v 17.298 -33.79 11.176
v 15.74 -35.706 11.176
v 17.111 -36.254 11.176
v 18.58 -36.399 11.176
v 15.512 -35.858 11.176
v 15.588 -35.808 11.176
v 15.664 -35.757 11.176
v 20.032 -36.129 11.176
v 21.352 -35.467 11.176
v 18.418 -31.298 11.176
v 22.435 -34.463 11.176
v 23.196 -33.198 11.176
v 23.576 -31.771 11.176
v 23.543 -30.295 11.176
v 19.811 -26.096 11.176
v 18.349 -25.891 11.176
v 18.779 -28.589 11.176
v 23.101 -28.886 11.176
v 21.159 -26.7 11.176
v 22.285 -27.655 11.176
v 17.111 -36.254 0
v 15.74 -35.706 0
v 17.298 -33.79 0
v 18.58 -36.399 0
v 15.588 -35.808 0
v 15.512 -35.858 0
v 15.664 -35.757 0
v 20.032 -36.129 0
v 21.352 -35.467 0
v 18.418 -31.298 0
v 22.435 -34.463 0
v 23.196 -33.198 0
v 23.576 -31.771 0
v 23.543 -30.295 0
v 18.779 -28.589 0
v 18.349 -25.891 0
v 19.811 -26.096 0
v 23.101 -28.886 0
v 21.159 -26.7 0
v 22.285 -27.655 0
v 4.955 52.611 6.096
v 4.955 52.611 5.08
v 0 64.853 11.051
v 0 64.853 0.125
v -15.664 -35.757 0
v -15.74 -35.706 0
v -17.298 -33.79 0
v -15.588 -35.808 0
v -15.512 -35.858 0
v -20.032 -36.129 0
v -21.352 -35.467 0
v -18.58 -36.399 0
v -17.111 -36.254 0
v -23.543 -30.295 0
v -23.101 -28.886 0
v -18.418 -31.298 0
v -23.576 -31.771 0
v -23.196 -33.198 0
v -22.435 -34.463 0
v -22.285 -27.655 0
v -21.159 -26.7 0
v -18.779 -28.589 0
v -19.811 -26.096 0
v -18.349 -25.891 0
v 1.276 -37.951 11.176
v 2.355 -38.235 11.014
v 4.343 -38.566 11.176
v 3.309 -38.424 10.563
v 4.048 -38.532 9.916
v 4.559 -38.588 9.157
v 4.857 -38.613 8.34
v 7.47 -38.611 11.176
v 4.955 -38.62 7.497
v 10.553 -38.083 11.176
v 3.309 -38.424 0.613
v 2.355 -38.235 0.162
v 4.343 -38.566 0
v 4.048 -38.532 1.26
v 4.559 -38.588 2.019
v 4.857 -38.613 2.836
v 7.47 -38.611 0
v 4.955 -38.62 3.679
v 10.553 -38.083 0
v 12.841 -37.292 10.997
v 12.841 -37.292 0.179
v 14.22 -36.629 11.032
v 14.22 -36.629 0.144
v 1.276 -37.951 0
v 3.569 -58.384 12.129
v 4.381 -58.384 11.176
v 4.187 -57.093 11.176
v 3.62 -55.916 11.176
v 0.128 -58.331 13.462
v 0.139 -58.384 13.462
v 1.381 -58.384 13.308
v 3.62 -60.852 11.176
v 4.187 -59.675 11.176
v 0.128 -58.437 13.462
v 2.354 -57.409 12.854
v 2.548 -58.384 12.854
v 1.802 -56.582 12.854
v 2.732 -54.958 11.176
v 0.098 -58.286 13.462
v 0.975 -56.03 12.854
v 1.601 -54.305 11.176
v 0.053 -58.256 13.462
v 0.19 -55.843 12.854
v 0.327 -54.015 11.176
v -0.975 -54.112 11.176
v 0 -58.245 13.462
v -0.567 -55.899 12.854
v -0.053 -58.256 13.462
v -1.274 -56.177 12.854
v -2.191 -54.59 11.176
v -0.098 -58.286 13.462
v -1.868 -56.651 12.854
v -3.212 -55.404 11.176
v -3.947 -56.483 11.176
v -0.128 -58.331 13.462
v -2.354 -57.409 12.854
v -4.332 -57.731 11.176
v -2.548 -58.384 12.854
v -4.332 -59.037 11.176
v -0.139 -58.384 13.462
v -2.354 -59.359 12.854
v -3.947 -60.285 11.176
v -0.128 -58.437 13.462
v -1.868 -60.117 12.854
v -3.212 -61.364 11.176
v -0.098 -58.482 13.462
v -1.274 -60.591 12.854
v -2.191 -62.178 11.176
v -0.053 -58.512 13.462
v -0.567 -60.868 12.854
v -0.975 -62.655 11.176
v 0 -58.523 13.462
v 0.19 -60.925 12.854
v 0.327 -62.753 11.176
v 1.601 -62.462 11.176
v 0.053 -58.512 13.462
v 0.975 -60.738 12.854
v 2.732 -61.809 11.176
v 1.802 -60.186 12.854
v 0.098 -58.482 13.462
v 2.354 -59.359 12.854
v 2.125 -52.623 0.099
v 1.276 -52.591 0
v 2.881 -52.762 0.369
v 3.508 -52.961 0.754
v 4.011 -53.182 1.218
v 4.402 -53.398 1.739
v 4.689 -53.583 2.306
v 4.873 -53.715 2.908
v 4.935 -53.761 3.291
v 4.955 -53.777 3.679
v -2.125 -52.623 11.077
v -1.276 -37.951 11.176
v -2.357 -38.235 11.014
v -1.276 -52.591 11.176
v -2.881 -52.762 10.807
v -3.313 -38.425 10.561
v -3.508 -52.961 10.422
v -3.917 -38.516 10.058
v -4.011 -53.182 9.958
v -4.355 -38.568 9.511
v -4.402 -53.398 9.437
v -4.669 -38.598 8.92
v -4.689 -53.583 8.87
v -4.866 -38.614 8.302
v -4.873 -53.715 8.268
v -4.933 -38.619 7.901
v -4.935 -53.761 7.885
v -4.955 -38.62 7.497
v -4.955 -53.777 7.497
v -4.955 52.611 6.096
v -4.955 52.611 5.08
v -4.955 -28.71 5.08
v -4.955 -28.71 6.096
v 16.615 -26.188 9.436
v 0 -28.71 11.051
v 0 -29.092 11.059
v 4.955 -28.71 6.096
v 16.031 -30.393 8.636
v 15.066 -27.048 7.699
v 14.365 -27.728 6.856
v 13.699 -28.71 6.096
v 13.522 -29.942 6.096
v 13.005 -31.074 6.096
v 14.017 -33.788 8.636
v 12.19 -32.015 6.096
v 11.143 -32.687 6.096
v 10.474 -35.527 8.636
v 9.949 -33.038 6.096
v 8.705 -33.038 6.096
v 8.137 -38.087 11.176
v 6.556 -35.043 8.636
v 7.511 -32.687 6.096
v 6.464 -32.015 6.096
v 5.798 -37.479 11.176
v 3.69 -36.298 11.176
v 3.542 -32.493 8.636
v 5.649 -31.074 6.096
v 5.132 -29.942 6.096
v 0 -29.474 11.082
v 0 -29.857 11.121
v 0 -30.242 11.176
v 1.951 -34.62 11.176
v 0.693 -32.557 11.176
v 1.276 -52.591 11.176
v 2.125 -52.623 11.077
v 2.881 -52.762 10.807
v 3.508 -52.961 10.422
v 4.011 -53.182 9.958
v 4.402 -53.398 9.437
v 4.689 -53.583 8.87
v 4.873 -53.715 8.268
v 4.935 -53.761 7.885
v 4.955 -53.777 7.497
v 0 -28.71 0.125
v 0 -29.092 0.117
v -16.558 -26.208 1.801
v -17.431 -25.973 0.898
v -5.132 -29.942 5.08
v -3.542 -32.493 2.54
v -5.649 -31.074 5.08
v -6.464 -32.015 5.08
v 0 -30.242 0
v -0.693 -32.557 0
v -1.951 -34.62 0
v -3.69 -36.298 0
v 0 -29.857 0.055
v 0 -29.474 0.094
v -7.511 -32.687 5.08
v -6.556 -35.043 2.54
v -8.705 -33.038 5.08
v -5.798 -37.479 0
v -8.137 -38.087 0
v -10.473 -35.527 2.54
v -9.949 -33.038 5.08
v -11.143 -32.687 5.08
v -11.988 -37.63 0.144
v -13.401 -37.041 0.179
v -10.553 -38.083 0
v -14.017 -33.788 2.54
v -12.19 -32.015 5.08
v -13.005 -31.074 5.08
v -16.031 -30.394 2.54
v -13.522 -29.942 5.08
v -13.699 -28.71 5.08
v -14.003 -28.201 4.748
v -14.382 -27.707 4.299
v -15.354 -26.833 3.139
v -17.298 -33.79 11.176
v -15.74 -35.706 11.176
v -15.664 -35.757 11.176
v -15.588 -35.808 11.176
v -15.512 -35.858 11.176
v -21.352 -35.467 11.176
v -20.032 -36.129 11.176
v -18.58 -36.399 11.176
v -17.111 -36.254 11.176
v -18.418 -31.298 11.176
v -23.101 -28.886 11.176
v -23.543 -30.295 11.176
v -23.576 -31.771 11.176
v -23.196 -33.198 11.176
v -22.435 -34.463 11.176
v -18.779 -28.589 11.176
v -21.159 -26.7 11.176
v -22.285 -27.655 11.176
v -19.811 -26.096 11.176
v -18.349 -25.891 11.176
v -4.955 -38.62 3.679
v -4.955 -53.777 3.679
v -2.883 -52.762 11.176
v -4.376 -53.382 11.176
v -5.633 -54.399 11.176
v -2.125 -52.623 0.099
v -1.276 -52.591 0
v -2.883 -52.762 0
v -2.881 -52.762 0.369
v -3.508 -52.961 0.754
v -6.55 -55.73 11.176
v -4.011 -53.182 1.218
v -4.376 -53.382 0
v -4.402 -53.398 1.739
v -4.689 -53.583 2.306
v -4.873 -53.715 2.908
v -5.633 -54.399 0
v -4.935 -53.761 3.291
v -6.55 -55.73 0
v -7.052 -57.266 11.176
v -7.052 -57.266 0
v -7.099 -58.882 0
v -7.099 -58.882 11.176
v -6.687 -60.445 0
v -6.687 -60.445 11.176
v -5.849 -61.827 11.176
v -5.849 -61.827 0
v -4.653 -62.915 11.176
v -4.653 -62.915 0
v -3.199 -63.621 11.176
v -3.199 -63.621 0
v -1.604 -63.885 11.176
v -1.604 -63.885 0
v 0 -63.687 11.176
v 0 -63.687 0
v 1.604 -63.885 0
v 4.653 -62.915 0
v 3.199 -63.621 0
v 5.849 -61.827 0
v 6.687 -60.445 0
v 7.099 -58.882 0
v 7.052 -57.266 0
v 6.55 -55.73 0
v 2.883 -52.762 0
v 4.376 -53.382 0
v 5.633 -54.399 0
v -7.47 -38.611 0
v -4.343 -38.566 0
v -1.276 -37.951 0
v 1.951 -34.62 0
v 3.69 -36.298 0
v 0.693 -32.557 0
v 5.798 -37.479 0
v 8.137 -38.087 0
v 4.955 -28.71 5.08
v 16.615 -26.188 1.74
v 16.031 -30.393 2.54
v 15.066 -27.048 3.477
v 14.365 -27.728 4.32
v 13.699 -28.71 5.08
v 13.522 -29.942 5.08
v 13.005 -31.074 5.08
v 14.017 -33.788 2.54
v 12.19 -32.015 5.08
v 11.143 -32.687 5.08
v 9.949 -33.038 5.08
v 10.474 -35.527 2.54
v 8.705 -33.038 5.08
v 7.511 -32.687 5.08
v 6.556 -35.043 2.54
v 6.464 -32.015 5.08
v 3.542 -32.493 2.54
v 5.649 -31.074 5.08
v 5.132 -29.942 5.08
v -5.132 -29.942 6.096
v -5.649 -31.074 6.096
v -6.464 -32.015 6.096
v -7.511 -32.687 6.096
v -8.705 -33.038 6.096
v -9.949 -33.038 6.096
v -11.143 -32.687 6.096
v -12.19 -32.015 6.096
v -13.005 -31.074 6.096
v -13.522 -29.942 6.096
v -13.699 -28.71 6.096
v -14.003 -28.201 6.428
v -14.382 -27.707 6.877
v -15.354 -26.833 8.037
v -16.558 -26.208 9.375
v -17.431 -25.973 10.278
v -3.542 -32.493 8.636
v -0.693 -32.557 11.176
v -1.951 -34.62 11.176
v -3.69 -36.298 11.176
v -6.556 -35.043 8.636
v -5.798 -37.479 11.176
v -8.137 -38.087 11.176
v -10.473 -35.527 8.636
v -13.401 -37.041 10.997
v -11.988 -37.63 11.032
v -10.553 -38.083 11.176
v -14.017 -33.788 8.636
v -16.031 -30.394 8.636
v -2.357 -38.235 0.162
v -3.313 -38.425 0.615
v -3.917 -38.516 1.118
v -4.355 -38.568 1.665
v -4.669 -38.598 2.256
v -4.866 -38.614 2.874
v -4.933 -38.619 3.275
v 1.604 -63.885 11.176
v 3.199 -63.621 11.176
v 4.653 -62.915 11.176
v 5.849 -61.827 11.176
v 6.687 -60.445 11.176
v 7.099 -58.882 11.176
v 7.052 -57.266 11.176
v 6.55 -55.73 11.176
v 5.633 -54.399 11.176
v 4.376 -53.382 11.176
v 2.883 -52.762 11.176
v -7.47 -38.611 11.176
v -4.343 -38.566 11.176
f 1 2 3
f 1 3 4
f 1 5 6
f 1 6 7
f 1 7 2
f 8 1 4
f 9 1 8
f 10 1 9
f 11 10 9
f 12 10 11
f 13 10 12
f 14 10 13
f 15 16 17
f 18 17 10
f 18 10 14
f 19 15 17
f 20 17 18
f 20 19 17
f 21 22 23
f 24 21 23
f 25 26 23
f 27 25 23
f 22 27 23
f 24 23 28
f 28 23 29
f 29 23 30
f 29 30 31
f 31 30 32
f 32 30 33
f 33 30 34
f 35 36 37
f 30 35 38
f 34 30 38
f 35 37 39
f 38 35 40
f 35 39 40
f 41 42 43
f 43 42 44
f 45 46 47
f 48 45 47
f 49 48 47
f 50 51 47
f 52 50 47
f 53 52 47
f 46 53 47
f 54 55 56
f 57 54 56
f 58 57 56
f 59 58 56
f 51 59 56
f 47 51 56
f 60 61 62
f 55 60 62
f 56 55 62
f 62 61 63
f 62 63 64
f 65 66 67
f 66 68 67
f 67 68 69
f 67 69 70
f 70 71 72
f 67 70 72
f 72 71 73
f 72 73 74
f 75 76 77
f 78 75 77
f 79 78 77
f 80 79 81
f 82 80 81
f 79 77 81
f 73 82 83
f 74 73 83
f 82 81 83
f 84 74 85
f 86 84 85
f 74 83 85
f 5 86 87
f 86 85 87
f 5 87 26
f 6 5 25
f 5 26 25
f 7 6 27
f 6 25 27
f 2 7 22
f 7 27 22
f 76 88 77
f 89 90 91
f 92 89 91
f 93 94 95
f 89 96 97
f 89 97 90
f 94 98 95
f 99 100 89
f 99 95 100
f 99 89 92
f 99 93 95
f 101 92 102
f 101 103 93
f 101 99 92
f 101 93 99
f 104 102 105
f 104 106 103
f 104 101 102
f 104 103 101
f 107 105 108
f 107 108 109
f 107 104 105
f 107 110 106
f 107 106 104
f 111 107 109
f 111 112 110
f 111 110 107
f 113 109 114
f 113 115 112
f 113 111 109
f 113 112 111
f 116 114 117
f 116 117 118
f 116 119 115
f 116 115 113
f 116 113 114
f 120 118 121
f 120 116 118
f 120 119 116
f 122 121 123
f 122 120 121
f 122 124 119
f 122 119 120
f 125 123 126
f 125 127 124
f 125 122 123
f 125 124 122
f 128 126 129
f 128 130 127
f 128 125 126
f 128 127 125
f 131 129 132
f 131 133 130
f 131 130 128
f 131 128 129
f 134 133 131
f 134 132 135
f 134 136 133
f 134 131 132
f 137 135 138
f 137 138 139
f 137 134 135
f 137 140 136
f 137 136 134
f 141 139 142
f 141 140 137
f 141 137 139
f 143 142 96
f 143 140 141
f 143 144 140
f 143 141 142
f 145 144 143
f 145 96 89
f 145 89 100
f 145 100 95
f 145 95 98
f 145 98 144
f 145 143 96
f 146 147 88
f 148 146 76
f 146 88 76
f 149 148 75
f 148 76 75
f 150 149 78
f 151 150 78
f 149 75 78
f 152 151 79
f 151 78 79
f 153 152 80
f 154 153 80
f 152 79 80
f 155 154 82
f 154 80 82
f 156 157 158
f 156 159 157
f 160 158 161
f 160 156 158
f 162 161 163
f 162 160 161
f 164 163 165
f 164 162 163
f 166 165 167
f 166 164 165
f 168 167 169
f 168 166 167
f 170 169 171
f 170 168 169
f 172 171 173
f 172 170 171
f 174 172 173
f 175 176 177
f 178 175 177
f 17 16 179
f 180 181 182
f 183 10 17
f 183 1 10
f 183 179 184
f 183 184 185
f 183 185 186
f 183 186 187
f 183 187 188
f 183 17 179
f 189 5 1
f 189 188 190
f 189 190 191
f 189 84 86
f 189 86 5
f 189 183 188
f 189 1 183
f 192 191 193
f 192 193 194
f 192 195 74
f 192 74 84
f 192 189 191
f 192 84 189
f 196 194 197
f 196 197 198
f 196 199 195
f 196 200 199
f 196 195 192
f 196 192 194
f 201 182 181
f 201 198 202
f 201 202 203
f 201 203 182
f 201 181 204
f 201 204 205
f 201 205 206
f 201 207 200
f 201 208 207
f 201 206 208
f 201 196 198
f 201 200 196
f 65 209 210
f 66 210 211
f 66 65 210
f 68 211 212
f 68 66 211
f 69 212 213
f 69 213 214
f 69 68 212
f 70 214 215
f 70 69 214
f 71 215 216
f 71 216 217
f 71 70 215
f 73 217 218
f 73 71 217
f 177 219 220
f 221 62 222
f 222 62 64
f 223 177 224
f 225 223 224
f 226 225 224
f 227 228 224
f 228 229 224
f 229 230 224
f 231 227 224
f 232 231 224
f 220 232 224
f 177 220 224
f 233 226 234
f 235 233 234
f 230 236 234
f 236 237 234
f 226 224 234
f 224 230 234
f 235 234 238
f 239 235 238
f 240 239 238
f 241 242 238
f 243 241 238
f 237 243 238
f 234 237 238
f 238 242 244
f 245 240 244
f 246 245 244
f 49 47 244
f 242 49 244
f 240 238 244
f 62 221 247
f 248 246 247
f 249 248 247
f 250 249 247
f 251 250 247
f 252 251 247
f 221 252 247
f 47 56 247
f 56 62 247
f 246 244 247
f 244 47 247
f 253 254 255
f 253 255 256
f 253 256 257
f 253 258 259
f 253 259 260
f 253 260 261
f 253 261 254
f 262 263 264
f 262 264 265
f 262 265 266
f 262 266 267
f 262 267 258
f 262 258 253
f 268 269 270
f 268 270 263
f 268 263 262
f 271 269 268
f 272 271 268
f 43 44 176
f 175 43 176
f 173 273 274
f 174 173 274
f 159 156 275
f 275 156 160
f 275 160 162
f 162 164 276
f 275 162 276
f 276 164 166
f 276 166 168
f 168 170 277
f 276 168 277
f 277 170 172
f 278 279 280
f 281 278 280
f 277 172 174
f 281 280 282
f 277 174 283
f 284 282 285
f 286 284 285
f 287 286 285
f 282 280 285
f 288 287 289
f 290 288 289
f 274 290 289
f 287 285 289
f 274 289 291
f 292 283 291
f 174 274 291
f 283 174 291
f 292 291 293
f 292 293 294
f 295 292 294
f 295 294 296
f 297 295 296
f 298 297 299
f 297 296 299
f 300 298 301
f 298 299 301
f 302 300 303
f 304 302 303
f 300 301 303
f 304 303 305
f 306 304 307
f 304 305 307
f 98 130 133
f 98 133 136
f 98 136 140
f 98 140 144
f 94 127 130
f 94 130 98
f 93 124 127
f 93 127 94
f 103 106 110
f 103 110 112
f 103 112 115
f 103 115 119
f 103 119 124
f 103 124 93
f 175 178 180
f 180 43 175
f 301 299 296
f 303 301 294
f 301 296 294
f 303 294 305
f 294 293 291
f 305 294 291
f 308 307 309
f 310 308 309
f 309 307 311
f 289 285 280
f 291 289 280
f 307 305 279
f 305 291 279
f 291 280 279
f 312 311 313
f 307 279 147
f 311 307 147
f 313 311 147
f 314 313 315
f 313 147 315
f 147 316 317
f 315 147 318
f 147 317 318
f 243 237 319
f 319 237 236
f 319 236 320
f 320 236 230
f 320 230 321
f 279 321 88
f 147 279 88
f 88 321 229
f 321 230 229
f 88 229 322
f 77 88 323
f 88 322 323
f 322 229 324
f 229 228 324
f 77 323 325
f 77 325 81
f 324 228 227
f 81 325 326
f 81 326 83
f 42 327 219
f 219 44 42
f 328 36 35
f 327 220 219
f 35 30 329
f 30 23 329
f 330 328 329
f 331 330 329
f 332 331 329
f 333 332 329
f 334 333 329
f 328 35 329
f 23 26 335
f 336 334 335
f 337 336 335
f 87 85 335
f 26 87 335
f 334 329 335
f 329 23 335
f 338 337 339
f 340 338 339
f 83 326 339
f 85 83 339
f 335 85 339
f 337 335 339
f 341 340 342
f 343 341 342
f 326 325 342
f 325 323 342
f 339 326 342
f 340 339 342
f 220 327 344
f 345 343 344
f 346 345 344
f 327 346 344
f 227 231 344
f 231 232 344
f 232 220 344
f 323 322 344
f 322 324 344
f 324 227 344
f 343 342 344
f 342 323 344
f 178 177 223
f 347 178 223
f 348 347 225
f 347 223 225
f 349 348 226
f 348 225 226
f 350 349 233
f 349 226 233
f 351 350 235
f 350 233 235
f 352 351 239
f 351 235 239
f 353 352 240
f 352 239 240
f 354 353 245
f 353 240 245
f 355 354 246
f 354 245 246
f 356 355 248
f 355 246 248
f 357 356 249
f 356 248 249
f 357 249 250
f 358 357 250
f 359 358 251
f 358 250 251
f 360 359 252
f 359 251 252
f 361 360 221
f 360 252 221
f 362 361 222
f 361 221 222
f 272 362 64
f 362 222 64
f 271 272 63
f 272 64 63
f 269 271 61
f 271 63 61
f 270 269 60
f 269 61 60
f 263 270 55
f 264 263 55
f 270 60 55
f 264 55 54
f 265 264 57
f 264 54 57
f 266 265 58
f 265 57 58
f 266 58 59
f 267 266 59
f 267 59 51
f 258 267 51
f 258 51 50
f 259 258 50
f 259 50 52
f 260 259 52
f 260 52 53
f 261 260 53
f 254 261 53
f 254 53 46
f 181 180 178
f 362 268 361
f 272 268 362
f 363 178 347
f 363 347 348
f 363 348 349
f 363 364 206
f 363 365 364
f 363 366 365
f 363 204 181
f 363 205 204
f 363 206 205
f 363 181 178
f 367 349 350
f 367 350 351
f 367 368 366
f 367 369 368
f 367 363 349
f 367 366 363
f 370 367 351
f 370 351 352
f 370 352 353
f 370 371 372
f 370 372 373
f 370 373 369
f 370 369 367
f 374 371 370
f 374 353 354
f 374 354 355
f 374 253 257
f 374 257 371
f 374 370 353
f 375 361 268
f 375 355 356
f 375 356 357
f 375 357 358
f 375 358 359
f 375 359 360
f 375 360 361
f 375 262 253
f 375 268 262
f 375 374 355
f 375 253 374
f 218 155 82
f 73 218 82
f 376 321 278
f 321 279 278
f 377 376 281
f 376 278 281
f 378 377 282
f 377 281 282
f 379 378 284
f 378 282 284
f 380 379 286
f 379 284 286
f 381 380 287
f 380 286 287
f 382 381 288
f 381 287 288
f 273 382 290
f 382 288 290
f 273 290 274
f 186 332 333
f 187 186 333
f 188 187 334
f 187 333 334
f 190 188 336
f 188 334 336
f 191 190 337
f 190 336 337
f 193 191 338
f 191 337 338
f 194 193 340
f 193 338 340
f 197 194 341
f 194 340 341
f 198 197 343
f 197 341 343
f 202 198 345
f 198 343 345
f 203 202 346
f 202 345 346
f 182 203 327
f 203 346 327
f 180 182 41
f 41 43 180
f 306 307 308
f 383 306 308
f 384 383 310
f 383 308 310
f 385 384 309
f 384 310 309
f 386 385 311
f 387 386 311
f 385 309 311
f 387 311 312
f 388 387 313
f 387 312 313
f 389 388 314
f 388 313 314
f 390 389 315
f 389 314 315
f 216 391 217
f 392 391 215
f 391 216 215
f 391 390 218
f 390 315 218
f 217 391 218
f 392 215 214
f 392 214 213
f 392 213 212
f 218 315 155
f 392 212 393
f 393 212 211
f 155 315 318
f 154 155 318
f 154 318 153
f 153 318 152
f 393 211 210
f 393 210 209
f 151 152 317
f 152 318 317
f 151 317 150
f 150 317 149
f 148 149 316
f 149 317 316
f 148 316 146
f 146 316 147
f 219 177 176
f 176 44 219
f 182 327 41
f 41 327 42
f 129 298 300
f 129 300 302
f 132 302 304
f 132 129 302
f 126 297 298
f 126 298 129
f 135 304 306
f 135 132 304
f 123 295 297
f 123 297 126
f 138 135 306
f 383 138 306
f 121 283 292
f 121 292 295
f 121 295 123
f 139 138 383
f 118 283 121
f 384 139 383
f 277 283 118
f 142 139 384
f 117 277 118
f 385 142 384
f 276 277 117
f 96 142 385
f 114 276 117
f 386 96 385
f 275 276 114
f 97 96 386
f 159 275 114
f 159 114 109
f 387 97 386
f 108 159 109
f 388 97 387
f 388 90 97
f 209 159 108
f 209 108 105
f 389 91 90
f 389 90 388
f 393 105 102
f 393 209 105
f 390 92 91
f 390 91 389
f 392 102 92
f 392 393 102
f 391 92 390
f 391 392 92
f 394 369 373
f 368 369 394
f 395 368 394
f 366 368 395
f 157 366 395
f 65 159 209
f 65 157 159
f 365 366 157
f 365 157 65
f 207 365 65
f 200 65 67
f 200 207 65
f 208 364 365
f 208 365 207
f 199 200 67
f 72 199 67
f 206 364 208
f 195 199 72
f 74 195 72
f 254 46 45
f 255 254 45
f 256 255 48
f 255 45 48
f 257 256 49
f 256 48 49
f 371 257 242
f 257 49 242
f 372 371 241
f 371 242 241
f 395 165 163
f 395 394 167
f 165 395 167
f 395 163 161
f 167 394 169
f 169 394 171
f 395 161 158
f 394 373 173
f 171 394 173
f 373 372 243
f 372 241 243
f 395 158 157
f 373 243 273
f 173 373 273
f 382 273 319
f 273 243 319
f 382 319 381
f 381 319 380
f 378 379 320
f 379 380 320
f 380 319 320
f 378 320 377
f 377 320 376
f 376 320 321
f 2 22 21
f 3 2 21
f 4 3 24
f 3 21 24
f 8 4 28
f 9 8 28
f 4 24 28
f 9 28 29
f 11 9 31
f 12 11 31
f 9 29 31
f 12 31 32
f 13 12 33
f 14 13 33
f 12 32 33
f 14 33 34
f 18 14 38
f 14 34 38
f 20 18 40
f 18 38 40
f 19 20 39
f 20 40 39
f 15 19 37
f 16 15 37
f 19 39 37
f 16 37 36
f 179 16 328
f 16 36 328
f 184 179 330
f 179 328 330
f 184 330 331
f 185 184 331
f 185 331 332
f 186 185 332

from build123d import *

# Parameters (mm, degrees)
F1_DEPTH     = 11.176
F2_T1_DEPTH  = 94.3857913817
F2_T4_ANGLE  = 351.4780510153
F2_T6_ANGLE  = 351.4780510153
F2_T8_ANGLE  = 351.4780510153
F2_T10_ANGLE = 351.4780510153
F3_R         = 3.6792614691
F4_R         = 3.6792614691
F5_R         = 4.3813050742
F6_DEPTH     = 2.286


# Not quite as in the source:
# - a fillet or chamfer that OpenCascade refuses, or shapes differently, is made with other operations: its cross-section is extruded or revolved along the edge and cut away or added


with BuildPart() as f1:
    # F0 (on Top) → F1 (new body)
    with BuildSketch(Plane.XY):
        with BuildLine():
            Line((4.9550826661, 52.6113137603), (0, 64.8532807827))
            Line((0, 64.8532807827), (-4.9550826661, 52.6113137603))
            Line((-4.9550826661, 52.6113137603), (-4.9550826661, -28.7103280425))
            ThreePointArc((-4.9550826661, -28.7103280425), (-9.3272130471, -33.0824584235), (-13.699343428, -28.7103280425))
            ThreePointArc((-13.699343428, -28.7103280425), (-23.4025628963, -29.6754723169), (-15.7396737486, -35.7057377696))
            ThreePointArc((-15.7396737486, -35.7057377696), (-10.5930074953, -38.0719437204), (-4.9550826661, -38.6204943061))
            Line((-4.9550826661, -38.6204943061), (-4.9550826661, -53.7772104144))
            ThreePointArc((-4.9550826661, -53.7772104144), (-6.5397395867, -60.7633924821), (0, -63.687376678))
            ThreePointArc((0, -63.687376678), (6.5397395867, -60.7633924821), (4.9550826661, -53.7772104144))
            Line((4.9550826661, -53.7772104144), (4.9550826661, -38.6204943061))
            ThreePointArc((4.9550826661, -38.6204943061), (10.5930074953, -38.0719437204), (15.7396737486, -35.7057377696))
            ThreePointArc((15.7396737486, -35.7057377696), (23.4025628963, -29.6754723169), (13.699343428, -28.7103280425))
            ThreePointArc((13.699343428, -28.7103280425), (9.3272130471, -33.0824584235), (4.9550826661, -28.7103280425))
            Line((4.9550826661, -28.7103280425), (4.9550826661, 52.6113137603))
        make_face()
    extrude(amount=F1_DEPTH)

    # F2: chamfer of 5.08 on 8 edges, made by hand

    # F2_s2 → F2_t1 (cut)
    with BuildSketch(Plane.XZ.offset(-65.6754633391)):
        Polygon((-4.9550826661, 6.096), (0.1249173339, 11.176), (-4.9550826661, 11.176), align=None)
        Polygon((4.9550826661, 6.096), (-0.1249173339, 11.176), (4.9550826661, 11.176), align=None)
        Polygon((-4.9550826661, 5.08), (0.1249173339, 0), (-4.9550826661, 0), align=None)
        Polygon((4.9550826661, 5.08), (-0.1249173339, 0), (4.9550826661, 0), align=None)
    extrude(amount=F2_T1_DEPTH, mode=Mode.SUBTRACT)

    # F2_s3 → F2_t4 (revolve, cut)
    with BuildSketch(Plane(origin=(-4.0027369728, -26.7129328444, 0), x_dir=(0, 0, 1), z_dir=(-0.1481882745, -0.9889591677, 0))):
        Polygon((5.08, -9.1066364436), (0, -4.0266364436), (0, -9.1066364436), align=None)
    revolve(axis=Axis((9.3272130471, -28.7103280425, 0), (0, 0, -1)), revolution_arc=F2_T4_ANGLE, mode=Mode.SUBTRACT)

    # F2_s5 → F2_t6 (revolve, cut)
    with BuildSketch(Plane(origin=(-4.0027369728, -26.7129328444, 0), x_dir=(0, 0, 1), z_dir=(-0.1481882745, -0.9889591677, 0))):
        Polygon((6.096, -9.1066364436), (11.176, -4.0266364436), (11.176, -9.1066364436), align=None)
    revolve(axis=Axis((9.3272130471, -28.7103280425, 11.176), (0, 0, -1)), revolution_arc=F2_T6_ANGLE, mode=Mode.SUBTRACT)

    # F2_s7 → F2_t8 (revolve, cut)
    with BuildSketch(Plane.XZ.offset(28.7103280425)):
        Polygon((-4.9550826661, 5.08), (0.1249173339, 0), (-4.9550826661, 0), align=None)
    revolve(axis=Axis((-9.3272130471, -28.7103280425, 0), (0, 0, -1)), revolution_arc=F2_T8_ANGLE, mode=Mode.SUBTRACT)

    # F2_s9 → F2_t10 (revolve, cut)
    with BuildSketch(Plane.XZ.offset(28.7103280425)):
        Polygon((-4.9550826661, 6.096), (0.1249173339, 11.176), (-4.9550826661, 11.176), align=None)
    revolve(axis=Axis((-9.3272130471, -28.7103280425, 11.176), (0, 0, -1)), revolution_arc=F2_T10_ANGLE, mode=Mode.SUBTRACT)

    # F3
    f3_edges = [f1.edges().sort_by_distance(p)[0] for p in [
        (-4.955083, -46.198852, 11.176),
    ]]
    fillet(f3_edges, radius=F3_R)

    # F4
    f4_edges = [f1.edges().sort_by_distance(p)[0] for p in [
        (4.955083, -46.198852, 11.176),
        (4.955083, -46.198852, 0),
        (-4.955083, -46.198852, 0),
    ]]
    fillet(f4_edges, radius=F4_R)

    # F5 (on face) → F6 (join)
    with BuildSketch(Plane.XY.offset(11.176)):
        with Locations((0, -58.3839304745)):
            Circle(F5_R)
    extrude(amount=F6_DEPTH)

    # F7: fillet of radius 5.08 on 1 edges, made by hand

    # F7_s1 → F7_t2 (revolve, cut)
    with BuildSketch(Plane.XZ.offset(58.3839304745)):
        with BuildLine():
            ThreePointArc((4.3813050742, 11.176), (2.5483242068, 12.8541314829), (0.1386686298, 13.462))
            Line((0.1386686298, 13.462), (4.3813050742, 13.462))
            Line((4.3813050742, 13.462), (4.3813050742, 11.176))
        make_face()
    revolve(axis=Axis((0, -58.3839304745, 13.462), (0, 0, 1)), mode=Mode.SUBTRACT)


solid = f1.part
